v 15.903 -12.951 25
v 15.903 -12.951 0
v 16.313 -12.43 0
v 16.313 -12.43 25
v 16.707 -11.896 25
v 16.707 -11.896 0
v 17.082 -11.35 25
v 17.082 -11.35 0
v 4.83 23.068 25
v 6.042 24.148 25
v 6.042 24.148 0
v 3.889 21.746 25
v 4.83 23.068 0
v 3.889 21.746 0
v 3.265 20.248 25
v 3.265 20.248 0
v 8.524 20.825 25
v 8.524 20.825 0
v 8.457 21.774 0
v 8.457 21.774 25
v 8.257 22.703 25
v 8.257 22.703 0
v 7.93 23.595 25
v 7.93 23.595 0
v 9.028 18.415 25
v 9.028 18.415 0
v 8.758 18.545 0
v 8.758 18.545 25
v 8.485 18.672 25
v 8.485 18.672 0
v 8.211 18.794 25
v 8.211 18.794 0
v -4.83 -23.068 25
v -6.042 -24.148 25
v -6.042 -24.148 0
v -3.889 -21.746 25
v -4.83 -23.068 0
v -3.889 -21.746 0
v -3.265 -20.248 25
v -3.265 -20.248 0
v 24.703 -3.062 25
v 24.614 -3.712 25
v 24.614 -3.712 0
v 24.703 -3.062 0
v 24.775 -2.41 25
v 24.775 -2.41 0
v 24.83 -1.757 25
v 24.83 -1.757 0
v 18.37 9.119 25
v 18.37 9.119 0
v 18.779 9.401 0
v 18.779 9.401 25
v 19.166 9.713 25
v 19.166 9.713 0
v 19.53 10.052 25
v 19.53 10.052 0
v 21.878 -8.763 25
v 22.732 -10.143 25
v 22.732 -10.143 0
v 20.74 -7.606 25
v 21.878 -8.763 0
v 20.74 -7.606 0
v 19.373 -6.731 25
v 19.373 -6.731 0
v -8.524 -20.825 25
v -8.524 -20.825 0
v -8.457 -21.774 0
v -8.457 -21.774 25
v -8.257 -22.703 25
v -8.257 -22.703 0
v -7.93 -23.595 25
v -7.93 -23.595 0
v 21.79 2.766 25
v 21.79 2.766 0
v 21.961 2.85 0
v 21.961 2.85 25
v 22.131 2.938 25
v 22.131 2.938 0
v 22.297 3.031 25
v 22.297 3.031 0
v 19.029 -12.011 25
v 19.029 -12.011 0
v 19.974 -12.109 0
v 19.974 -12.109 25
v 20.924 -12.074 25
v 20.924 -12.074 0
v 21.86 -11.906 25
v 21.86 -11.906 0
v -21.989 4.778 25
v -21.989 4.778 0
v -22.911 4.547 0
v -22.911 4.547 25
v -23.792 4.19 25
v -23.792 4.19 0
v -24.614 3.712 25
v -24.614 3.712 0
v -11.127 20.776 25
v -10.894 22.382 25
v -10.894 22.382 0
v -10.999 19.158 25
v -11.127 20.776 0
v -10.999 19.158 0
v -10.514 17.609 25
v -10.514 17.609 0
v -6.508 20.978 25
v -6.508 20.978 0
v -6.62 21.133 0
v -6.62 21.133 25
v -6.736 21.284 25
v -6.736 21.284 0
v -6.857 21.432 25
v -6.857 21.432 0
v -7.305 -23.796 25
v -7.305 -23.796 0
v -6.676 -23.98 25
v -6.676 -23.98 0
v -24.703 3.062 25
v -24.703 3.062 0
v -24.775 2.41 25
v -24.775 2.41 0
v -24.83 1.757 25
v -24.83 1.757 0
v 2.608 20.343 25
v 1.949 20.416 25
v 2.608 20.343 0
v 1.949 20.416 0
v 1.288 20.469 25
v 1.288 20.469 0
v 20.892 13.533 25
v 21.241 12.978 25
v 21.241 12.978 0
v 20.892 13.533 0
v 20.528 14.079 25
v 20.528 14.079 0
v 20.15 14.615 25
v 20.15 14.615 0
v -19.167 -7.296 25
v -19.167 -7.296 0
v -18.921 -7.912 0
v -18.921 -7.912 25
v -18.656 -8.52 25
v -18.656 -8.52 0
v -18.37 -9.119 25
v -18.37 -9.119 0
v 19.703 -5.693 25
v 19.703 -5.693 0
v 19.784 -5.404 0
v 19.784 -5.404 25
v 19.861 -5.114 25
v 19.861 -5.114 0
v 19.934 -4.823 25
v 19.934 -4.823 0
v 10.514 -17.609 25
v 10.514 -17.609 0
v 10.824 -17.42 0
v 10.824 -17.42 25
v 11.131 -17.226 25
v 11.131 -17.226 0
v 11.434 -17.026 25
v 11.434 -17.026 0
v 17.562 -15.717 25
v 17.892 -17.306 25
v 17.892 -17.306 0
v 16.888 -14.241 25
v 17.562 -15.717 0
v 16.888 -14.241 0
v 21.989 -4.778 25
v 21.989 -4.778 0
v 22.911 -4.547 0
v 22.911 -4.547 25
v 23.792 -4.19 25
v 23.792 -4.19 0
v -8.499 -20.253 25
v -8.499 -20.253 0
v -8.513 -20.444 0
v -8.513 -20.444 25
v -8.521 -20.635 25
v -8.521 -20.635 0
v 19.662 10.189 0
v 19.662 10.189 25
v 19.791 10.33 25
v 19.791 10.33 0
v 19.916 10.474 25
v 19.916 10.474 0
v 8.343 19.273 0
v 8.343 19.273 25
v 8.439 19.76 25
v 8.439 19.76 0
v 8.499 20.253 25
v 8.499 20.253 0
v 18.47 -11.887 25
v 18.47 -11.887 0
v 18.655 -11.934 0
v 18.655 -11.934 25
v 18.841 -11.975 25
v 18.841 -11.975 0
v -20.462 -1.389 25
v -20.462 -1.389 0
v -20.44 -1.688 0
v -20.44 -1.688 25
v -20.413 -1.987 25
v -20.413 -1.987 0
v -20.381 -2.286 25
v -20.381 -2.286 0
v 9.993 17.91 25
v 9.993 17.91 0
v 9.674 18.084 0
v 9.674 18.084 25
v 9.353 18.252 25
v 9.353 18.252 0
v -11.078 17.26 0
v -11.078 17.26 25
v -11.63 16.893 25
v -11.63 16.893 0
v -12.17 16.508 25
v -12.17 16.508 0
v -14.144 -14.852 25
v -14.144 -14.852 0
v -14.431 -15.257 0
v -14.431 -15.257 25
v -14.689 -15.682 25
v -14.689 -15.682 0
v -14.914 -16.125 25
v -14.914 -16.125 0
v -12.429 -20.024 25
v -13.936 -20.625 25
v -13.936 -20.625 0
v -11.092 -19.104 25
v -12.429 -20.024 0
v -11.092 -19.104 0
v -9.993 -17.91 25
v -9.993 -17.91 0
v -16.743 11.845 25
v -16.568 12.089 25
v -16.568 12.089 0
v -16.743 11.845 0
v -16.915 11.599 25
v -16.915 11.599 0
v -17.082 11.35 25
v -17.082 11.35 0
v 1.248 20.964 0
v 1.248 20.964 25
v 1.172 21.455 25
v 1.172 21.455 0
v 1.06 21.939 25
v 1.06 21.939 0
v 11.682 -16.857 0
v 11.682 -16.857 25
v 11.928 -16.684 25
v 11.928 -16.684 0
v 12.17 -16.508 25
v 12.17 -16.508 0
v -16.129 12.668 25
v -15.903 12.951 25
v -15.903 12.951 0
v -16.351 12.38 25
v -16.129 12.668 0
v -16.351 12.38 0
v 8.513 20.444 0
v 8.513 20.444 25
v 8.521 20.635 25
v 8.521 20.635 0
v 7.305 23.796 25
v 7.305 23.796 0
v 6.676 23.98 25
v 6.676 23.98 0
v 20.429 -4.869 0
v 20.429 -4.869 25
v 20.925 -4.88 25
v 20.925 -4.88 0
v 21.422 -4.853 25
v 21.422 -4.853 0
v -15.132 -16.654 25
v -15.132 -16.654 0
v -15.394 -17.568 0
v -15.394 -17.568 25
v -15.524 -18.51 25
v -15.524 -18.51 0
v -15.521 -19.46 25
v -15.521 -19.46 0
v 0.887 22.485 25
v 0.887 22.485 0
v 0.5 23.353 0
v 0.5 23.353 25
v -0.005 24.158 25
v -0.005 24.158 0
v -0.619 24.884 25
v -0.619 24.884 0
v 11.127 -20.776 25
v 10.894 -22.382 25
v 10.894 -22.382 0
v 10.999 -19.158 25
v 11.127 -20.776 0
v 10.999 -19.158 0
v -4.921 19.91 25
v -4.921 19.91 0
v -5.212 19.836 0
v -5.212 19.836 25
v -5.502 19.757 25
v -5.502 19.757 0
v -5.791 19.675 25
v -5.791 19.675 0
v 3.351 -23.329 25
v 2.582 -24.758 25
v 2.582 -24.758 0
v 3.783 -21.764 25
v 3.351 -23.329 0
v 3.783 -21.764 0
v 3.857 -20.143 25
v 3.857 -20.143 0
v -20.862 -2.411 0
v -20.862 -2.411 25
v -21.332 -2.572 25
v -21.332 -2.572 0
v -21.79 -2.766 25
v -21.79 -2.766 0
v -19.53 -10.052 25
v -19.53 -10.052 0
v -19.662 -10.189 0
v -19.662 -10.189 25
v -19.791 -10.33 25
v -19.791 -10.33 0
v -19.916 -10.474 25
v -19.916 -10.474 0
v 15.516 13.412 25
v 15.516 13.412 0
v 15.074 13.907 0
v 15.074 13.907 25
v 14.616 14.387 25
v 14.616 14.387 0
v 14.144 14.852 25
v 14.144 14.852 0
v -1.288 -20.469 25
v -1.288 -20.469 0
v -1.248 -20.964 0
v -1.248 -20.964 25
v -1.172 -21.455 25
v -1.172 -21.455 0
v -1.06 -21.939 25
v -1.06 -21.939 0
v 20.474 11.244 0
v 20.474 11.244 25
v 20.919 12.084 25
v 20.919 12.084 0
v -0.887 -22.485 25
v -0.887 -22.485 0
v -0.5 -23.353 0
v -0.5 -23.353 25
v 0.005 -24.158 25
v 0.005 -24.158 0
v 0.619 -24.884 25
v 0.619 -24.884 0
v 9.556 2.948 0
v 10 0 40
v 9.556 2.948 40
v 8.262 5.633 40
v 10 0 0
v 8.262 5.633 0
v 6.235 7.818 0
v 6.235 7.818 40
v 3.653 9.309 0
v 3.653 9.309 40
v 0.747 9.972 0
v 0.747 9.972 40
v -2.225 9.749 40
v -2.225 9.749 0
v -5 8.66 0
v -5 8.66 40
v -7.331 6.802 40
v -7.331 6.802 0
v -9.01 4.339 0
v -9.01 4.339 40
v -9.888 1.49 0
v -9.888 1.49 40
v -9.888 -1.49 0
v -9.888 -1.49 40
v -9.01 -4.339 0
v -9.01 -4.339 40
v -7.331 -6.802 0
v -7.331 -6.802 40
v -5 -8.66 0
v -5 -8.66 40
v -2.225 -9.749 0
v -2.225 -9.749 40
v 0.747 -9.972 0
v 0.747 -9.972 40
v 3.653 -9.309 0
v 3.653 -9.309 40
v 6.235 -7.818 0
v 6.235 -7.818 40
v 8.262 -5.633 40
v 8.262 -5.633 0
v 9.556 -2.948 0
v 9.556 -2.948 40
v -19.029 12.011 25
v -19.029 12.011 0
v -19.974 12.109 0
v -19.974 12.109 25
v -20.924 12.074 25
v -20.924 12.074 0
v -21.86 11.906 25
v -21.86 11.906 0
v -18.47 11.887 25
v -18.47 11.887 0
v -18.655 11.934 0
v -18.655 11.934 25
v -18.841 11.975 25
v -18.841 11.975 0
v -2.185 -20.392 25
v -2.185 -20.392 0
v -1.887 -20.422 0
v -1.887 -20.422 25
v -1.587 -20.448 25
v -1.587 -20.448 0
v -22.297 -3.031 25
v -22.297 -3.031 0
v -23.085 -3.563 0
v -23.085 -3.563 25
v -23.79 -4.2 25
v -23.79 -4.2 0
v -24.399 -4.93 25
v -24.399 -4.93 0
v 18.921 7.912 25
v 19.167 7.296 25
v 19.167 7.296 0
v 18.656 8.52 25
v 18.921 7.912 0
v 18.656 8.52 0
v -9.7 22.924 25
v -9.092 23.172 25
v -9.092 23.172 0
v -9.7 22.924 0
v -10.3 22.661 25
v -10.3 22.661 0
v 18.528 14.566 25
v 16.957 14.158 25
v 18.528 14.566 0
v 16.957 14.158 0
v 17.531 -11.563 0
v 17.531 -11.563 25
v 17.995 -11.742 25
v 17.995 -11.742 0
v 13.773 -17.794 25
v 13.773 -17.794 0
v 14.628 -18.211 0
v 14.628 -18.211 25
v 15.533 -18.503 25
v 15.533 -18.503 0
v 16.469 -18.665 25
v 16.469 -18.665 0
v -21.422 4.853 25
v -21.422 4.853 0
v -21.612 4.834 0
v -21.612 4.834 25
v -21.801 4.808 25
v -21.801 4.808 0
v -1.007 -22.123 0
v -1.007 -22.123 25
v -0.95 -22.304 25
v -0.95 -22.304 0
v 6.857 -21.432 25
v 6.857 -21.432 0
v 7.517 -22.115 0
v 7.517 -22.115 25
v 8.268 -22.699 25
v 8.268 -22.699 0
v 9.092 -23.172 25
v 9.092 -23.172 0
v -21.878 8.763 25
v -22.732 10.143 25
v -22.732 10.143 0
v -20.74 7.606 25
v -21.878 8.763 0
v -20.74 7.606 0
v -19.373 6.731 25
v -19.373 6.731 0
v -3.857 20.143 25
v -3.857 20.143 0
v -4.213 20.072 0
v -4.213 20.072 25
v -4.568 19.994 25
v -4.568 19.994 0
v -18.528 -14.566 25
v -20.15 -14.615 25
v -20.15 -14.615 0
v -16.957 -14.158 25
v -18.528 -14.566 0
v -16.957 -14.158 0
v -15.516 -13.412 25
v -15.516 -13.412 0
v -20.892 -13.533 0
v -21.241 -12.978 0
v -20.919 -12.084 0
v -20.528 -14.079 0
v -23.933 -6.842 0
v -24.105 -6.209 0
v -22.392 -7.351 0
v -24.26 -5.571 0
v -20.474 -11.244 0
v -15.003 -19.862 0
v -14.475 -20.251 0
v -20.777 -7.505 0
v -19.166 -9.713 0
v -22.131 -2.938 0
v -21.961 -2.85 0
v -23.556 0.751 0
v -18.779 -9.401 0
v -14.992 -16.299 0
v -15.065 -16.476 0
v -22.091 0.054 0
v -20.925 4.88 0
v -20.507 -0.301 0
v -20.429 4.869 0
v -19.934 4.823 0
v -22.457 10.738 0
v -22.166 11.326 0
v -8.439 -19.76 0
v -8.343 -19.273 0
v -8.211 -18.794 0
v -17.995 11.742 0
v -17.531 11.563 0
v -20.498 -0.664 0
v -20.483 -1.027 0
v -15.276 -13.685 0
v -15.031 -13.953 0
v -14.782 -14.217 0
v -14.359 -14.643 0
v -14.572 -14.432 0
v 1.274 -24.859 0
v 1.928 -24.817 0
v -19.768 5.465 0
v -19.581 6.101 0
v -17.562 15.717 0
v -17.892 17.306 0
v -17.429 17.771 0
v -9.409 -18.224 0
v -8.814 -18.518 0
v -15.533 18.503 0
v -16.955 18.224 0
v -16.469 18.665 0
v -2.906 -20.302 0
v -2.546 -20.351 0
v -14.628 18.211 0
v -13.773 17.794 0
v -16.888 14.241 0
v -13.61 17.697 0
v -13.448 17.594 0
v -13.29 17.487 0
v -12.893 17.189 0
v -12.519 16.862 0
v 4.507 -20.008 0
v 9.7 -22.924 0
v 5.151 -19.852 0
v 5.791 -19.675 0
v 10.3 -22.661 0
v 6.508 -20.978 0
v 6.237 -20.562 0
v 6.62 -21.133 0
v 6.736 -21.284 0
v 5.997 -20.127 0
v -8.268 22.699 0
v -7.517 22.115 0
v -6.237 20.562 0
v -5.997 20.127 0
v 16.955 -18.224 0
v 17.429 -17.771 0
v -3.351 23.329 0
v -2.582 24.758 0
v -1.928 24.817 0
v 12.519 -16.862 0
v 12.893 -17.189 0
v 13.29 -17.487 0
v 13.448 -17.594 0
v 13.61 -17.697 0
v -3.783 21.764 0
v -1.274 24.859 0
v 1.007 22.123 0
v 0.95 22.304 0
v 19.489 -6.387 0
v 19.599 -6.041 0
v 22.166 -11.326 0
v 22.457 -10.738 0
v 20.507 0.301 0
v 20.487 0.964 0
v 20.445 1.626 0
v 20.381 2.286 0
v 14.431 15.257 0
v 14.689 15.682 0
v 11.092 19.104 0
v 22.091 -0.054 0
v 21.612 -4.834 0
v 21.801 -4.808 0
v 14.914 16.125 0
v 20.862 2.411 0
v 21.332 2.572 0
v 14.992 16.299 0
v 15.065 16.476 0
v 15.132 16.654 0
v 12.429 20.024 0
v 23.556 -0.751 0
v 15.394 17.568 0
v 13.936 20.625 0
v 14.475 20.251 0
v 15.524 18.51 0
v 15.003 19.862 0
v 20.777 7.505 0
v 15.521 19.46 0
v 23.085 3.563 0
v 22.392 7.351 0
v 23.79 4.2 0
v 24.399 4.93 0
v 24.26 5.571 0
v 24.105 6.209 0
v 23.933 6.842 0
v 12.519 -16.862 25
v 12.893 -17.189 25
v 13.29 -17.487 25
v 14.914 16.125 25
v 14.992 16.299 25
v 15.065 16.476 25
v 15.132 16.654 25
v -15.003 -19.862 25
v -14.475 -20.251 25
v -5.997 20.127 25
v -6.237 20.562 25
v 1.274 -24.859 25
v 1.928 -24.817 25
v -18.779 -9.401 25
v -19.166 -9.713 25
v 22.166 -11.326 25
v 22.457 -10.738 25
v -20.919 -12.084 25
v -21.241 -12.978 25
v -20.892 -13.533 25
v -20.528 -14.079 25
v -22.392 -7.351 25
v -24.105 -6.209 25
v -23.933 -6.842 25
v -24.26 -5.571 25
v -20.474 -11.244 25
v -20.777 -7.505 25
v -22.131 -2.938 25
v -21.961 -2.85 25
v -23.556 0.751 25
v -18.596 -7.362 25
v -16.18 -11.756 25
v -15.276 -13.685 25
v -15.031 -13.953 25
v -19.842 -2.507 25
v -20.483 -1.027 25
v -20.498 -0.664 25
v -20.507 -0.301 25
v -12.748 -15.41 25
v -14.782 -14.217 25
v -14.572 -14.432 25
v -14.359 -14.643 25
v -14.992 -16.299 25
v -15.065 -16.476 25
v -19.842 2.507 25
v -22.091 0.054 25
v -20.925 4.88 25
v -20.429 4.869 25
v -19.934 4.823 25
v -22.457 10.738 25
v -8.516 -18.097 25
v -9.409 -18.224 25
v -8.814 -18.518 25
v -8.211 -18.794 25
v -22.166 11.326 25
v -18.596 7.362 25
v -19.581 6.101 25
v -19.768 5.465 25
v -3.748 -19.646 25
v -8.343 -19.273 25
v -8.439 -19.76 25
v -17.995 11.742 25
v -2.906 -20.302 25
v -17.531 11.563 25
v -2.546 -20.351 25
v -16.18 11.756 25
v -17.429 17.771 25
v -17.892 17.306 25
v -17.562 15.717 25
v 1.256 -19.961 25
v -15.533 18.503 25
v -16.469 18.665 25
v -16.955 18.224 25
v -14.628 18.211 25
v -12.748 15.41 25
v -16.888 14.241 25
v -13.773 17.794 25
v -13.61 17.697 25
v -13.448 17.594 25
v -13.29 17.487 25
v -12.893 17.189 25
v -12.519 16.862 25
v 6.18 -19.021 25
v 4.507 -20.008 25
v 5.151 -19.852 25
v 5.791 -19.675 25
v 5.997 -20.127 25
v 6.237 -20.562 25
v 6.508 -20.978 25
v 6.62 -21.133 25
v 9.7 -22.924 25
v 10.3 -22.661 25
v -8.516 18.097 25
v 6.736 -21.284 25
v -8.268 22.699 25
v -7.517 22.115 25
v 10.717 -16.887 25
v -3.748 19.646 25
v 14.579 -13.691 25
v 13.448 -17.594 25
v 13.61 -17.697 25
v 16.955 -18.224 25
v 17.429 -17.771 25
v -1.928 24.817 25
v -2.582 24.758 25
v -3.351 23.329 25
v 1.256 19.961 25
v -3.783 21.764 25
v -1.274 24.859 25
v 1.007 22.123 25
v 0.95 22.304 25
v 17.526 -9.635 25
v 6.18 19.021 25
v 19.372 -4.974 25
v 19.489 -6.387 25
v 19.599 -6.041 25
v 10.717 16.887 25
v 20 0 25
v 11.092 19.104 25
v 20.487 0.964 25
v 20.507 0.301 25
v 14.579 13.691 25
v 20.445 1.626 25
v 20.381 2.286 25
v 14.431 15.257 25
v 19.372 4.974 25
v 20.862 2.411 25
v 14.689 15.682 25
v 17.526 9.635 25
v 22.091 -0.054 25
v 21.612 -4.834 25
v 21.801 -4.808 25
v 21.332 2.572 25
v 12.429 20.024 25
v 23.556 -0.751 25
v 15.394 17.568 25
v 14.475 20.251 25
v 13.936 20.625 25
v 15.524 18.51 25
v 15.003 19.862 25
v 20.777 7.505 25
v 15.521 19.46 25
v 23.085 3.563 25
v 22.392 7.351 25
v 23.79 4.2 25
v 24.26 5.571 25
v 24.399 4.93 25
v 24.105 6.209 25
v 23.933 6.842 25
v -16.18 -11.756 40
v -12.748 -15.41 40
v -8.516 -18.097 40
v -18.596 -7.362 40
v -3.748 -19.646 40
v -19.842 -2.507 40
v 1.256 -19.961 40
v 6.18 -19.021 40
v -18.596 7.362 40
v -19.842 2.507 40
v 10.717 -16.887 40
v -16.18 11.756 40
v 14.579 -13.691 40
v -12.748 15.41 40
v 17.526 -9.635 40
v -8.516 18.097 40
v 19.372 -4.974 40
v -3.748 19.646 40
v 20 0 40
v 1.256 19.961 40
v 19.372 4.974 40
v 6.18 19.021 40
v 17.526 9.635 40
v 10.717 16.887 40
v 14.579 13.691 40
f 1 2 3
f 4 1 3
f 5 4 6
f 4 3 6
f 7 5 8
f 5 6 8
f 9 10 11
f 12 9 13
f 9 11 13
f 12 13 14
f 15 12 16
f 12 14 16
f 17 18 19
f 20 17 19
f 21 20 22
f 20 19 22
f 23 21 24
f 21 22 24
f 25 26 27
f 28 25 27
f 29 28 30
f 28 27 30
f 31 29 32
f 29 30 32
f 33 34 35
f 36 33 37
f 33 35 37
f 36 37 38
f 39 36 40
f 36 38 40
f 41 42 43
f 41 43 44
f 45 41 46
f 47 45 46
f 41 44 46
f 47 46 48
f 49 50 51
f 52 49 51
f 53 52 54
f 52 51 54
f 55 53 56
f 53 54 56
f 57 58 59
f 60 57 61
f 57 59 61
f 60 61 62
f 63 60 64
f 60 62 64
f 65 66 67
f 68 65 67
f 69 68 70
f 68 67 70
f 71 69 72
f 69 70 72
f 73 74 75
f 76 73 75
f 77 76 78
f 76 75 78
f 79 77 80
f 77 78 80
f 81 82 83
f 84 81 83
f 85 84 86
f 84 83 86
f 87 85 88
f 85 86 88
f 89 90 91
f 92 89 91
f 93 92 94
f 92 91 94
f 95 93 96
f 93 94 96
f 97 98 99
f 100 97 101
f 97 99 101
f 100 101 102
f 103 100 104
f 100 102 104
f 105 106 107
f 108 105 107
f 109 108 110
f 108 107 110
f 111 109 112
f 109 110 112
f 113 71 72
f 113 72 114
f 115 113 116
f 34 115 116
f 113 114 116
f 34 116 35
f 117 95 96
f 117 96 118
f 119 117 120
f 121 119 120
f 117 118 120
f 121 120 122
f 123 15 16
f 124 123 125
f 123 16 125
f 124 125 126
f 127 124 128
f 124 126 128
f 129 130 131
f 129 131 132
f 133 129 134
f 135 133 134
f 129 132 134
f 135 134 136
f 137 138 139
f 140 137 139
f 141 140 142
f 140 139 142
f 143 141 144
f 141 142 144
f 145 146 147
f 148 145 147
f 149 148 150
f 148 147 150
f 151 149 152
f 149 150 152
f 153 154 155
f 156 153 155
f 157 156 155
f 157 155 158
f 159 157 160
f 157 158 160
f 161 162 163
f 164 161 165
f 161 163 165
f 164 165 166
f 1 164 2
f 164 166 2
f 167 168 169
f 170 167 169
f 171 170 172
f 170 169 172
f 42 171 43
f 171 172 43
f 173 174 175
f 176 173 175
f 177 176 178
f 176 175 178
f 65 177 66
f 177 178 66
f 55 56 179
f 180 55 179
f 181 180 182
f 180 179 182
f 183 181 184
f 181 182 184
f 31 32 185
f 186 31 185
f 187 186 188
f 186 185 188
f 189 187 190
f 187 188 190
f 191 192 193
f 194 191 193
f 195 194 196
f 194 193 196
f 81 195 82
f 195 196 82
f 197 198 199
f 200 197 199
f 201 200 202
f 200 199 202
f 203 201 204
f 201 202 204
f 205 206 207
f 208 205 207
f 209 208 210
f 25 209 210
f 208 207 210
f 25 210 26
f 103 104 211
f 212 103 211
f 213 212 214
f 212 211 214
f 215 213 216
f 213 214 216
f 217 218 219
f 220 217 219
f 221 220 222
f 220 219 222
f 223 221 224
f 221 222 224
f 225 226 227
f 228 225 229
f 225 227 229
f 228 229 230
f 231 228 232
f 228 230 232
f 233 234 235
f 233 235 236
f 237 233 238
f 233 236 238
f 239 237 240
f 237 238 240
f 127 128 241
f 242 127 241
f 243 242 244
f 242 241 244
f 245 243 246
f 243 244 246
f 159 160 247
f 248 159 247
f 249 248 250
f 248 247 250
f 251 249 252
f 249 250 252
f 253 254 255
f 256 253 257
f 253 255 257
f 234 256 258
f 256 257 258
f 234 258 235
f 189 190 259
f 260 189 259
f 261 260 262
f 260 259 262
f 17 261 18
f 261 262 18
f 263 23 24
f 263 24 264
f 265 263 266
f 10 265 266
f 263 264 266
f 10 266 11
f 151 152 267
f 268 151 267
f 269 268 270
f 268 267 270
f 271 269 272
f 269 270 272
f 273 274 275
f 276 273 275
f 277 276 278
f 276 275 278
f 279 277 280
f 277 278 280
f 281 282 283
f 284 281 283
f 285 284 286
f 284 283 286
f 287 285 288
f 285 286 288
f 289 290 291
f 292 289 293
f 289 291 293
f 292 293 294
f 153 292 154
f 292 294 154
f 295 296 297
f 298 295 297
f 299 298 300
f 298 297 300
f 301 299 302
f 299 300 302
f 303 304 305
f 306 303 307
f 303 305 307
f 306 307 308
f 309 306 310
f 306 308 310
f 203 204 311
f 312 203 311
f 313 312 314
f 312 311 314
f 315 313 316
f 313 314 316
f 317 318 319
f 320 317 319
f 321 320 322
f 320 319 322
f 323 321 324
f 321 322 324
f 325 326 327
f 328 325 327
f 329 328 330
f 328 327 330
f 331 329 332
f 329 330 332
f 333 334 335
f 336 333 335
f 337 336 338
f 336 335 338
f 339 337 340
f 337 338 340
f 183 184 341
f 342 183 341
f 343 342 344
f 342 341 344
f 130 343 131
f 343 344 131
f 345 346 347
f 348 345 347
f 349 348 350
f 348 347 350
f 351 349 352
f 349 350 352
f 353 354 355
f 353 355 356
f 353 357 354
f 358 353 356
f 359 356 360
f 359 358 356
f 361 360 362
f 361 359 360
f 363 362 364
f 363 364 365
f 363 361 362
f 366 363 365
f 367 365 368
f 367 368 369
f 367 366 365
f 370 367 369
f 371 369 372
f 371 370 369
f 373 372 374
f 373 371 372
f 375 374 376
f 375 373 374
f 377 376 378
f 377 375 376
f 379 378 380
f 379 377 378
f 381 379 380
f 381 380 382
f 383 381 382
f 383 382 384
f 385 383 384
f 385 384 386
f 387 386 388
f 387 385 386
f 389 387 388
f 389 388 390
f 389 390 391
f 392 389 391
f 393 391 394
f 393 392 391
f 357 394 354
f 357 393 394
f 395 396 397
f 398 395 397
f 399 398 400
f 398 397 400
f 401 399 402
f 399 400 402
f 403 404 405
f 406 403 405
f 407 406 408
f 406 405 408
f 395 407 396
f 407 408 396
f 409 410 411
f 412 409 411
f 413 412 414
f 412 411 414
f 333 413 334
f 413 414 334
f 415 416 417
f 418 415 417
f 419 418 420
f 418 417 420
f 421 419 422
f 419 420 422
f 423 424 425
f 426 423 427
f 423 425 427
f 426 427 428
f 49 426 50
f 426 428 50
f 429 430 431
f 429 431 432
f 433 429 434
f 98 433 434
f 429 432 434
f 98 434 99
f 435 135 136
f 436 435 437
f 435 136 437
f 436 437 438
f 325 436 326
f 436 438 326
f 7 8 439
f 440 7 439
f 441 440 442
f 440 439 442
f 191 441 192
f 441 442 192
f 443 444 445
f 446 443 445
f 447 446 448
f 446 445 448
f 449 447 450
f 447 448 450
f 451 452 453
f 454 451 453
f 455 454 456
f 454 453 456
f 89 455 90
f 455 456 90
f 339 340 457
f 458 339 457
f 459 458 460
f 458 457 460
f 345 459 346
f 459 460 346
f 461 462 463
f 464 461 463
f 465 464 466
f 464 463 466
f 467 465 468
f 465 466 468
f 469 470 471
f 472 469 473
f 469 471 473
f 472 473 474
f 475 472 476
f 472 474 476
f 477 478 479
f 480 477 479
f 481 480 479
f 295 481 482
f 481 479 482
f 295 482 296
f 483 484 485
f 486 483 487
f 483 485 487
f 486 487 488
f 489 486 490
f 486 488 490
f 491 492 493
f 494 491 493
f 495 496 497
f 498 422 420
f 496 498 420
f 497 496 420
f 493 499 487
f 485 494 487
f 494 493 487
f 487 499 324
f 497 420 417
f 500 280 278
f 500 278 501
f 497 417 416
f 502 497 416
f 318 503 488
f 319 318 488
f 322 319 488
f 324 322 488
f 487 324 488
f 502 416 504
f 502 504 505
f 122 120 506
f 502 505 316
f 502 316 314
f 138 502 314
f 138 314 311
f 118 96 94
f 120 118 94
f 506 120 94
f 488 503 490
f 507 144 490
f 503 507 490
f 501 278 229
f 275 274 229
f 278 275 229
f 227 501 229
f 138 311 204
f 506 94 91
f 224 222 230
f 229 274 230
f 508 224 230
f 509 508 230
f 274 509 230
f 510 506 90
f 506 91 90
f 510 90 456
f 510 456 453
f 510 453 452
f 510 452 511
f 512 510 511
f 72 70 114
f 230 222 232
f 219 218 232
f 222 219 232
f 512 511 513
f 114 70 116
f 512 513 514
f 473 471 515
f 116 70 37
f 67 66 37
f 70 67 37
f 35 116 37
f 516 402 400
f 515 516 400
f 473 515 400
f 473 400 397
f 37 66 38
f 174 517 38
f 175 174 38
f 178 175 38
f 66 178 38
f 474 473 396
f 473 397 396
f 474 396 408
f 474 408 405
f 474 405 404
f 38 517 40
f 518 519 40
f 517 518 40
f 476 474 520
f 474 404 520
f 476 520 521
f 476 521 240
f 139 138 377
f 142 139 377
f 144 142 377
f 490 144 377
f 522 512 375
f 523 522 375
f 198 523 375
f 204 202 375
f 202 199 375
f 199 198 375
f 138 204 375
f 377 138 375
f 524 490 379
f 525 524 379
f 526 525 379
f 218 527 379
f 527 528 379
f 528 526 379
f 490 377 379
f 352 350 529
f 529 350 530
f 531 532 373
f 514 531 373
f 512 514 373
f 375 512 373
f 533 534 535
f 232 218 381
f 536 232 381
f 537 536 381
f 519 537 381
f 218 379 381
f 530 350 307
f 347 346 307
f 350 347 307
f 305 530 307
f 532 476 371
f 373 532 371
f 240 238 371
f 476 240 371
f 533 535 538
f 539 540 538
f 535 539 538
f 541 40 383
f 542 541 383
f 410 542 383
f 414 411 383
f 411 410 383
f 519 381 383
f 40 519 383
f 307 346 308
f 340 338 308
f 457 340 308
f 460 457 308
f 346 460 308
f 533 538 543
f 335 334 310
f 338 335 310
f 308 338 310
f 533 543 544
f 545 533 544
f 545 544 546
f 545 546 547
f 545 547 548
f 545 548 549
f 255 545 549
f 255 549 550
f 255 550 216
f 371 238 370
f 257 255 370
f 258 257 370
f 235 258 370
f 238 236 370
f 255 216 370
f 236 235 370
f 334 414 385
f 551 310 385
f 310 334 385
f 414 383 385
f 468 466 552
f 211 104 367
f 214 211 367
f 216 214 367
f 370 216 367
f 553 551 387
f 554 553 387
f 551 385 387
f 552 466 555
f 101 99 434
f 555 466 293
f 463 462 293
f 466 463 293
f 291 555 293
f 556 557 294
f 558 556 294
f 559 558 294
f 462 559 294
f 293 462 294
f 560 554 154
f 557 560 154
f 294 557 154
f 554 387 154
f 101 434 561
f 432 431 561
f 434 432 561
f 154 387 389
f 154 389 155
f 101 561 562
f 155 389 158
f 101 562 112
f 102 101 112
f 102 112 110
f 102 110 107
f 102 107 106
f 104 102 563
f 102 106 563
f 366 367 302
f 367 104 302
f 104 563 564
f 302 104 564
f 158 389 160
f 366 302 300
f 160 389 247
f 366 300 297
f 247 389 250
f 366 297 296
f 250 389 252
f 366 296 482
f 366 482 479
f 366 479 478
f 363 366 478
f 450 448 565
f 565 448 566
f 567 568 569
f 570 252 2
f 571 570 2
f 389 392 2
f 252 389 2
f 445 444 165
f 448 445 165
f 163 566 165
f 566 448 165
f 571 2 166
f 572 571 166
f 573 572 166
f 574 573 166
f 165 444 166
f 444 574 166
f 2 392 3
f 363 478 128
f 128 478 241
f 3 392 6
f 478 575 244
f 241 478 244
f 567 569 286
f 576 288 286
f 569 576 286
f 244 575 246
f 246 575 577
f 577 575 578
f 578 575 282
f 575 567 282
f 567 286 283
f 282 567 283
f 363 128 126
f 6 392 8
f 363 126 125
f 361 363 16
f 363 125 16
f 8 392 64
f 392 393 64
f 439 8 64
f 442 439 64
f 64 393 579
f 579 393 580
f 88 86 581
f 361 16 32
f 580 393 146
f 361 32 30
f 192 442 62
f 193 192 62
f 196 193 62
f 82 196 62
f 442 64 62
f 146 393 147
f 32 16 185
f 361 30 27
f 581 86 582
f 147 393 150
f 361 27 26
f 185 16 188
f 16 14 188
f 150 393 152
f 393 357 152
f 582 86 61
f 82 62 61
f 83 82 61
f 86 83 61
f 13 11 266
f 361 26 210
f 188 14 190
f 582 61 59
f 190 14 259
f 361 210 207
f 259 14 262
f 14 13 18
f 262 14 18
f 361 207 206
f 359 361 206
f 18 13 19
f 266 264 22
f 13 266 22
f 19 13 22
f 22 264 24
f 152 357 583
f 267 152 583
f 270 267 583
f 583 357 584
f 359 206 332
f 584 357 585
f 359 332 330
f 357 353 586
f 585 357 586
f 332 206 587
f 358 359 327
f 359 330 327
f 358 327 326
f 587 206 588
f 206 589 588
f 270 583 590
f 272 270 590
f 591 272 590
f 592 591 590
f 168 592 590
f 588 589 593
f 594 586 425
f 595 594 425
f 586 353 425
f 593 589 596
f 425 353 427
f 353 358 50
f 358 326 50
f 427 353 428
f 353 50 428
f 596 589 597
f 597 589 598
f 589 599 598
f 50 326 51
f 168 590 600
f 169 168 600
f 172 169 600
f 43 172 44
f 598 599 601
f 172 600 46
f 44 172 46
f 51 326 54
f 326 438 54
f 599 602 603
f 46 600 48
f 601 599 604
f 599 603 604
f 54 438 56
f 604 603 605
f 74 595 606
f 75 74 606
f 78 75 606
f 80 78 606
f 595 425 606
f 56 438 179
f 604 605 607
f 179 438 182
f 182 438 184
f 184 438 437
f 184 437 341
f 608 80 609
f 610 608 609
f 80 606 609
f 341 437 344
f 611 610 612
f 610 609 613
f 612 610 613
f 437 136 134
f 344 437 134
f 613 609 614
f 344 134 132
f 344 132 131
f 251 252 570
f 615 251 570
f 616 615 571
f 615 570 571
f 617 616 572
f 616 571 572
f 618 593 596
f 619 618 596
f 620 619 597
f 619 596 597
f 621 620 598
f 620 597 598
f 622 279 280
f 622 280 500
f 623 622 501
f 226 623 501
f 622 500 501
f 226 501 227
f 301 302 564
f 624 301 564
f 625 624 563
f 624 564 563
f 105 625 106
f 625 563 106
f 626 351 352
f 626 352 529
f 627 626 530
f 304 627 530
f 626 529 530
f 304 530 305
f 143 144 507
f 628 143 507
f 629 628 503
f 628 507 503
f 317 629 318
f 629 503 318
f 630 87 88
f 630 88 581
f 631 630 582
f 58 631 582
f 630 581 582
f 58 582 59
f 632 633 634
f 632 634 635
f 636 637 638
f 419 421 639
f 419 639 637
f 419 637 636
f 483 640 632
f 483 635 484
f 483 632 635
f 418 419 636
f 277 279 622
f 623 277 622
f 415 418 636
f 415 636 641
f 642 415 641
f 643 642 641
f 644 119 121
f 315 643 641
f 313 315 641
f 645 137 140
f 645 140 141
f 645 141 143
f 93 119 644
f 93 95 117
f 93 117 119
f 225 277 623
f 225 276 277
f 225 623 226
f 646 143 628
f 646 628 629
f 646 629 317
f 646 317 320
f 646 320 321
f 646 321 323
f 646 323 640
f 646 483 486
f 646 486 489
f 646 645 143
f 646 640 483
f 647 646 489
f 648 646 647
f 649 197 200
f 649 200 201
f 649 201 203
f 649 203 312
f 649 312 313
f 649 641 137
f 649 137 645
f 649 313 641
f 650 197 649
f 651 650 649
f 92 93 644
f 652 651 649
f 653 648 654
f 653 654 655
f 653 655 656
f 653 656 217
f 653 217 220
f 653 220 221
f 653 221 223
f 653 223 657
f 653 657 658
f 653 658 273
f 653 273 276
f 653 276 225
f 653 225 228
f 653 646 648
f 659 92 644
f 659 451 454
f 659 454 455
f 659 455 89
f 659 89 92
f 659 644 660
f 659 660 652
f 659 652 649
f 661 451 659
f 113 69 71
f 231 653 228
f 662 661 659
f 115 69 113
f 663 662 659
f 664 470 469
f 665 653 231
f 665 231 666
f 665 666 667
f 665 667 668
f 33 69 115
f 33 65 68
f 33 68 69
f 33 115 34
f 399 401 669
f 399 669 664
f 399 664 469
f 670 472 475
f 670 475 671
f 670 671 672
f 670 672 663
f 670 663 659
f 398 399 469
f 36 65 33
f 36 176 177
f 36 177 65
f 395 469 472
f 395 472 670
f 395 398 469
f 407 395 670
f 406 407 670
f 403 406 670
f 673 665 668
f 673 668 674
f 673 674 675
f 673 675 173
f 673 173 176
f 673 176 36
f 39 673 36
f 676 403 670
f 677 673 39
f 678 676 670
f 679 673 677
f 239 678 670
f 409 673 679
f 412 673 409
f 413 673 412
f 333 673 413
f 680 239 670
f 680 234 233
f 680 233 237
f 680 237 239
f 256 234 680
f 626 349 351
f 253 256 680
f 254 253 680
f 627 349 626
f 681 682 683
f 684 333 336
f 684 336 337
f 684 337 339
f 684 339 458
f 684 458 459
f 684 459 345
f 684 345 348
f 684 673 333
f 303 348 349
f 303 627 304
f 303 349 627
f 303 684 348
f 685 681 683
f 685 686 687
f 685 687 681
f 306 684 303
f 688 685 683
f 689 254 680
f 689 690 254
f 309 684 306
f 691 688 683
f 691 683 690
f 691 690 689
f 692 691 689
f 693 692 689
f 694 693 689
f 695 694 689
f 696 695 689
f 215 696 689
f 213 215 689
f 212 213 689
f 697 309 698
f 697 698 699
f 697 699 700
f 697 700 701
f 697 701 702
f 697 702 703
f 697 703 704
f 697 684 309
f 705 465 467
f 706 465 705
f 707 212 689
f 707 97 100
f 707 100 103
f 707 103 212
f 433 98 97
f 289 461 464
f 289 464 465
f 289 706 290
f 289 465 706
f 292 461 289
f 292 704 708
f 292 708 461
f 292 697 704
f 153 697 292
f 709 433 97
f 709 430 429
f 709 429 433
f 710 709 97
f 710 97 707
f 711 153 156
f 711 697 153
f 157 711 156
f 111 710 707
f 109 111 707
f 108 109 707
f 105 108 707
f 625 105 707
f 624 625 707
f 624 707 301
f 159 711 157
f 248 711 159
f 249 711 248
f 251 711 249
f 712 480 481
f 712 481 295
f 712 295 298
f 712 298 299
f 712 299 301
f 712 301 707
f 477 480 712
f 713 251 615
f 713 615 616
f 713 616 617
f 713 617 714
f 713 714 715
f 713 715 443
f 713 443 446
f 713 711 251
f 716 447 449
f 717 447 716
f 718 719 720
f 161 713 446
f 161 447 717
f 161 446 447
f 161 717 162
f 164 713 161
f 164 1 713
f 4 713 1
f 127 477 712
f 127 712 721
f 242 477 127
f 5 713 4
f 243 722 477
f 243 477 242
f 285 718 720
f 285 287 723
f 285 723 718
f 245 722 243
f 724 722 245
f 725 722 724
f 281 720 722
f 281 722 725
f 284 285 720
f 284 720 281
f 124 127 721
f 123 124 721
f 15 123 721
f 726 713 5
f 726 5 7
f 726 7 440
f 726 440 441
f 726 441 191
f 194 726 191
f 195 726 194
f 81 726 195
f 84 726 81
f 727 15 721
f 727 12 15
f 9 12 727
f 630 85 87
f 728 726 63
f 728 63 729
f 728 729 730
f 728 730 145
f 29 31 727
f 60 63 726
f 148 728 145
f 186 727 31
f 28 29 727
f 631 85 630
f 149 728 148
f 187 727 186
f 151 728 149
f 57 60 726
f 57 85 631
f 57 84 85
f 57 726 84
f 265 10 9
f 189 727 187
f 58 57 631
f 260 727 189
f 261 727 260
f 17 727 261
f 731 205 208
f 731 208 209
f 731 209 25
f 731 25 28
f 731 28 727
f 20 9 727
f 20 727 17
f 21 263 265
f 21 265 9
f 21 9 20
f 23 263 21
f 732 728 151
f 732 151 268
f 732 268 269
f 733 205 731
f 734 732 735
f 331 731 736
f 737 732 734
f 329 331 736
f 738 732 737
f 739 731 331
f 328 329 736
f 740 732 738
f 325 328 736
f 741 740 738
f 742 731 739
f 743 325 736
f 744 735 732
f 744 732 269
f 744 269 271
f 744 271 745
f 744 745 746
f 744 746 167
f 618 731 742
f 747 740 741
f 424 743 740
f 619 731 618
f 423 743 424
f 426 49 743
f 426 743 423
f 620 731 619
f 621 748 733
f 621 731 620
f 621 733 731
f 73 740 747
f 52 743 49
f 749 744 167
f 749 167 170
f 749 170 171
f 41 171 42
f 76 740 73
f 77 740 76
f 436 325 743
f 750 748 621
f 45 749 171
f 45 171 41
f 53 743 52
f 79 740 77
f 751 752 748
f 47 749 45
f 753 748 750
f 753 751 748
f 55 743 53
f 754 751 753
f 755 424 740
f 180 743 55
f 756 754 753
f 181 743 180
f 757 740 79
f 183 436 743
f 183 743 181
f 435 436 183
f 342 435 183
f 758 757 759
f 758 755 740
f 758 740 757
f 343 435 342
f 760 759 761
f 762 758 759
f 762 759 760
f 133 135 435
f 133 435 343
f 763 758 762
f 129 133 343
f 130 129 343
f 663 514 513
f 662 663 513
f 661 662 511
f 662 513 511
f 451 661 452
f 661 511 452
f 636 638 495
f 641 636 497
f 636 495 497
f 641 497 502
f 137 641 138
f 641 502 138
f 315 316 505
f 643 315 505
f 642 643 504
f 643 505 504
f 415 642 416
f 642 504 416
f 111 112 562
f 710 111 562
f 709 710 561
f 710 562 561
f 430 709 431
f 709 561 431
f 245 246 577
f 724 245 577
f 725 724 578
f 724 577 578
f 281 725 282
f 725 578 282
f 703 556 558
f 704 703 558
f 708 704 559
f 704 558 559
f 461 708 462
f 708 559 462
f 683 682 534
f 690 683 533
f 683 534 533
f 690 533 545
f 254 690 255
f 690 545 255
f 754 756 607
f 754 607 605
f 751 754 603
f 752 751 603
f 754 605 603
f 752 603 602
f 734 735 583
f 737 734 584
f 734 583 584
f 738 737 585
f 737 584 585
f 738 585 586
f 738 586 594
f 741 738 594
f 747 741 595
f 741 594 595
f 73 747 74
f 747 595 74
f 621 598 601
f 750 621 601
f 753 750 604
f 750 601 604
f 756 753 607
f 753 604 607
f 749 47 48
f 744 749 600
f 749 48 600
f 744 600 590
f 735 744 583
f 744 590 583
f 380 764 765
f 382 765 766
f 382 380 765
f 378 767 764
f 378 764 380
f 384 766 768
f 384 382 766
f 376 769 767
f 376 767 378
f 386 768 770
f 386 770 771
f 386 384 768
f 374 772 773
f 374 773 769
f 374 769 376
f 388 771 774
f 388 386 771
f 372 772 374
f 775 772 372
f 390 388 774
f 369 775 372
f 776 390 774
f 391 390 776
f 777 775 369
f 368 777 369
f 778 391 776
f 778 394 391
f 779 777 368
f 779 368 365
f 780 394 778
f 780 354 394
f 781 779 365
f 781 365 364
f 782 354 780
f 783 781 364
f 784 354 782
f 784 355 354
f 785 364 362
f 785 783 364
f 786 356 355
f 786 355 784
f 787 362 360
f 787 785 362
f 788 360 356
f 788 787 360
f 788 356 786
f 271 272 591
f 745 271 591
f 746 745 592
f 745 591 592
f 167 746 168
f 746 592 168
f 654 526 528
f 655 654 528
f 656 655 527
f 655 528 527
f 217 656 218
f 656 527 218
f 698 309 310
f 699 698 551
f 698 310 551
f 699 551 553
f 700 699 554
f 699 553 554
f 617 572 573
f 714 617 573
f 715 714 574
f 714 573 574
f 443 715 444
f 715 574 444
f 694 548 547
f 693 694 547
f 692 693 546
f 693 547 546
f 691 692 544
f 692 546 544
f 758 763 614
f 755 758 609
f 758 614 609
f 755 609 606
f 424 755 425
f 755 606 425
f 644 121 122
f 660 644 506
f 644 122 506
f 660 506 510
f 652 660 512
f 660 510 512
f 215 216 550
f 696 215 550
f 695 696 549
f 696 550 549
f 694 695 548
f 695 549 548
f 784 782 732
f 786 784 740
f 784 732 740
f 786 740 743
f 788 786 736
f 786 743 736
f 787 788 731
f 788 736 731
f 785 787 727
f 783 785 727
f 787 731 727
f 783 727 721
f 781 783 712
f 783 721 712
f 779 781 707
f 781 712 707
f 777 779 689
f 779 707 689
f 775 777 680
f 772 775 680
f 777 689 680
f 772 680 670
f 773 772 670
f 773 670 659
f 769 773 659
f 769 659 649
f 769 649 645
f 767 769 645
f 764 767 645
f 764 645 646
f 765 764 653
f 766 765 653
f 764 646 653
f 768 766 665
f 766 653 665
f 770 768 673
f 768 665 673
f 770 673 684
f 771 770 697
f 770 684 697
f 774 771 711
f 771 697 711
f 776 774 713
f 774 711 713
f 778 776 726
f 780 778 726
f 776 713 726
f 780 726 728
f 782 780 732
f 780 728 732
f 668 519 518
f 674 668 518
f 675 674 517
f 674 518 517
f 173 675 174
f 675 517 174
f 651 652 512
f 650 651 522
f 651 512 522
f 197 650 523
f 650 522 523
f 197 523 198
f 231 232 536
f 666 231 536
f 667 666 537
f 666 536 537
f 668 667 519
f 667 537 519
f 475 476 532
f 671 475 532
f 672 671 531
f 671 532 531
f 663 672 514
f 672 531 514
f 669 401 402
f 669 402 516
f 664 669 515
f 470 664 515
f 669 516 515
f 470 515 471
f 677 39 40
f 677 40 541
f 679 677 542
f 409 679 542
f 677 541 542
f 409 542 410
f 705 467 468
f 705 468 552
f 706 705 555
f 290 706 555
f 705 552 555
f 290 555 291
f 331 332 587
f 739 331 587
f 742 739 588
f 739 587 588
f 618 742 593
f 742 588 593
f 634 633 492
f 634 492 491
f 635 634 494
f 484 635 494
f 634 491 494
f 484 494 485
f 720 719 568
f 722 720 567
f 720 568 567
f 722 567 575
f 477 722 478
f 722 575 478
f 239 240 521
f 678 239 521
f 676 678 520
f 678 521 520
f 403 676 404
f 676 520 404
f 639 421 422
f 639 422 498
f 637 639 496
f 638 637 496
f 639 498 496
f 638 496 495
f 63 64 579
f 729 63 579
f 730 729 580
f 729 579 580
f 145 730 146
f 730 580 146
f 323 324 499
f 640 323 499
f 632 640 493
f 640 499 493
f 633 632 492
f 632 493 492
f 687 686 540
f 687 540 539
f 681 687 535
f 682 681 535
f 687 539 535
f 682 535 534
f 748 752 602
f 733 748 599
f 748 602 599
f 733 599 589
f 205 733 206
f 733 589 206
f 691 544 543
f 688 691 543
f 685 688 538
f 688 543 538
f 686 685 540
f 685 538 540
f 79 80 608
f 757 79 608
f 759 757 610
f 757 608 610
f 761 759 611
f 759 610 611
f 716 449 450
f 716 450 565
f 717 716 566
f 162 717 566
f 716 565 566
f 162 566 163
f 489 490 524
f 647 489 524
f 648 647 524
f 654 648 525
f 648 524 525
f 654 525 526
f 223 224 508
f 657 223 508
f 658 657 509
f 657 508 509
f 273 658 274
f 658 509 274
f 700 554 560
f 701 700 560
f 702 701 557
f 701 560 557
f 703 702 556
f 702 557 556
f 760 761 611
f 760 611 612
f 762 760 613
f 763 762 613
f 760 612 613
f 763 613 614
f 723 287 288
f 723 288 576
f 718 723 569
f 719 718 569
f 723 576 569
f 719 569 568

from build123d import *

# Parameters (mm, degrees)
F0_R     = 10
F1_DEPTH = 25
F2_COUNT = 18
F3_R     = 20
F3_R_2   = 10
F4_DEPTH = 15


with BuildPart() as f1:
    # F0 (on Top) → F1 (new body)
    with BuildSketch(Plane.XY):
        with BuildLine():
            ThreePointArc((7.9296197565, 23.5951858335), (6.9911317973, 23.8900761864), (6.0417249702, 24.1476546146))
            ThreePointArc((6.0417249702, 24.1476546146), (4.3226425573, 22.4330749308), (3.2648662162, 20.2476374354))
            ThreePointArc((3.2648662162, 20.2476374354), (5.7837443287, 19.6767495961), (8.2108987358, 18.7938105523))
            ThreePointArc((8.2108987358, 18.7938105523), (8.3954934616, 19.5156536929), (8.4994507341, 20.2534379554))
            ThreePointArc((8.4994507341, 20.2534379554), (8.5176465567, 20.5391701676), (8.5237154667, 20.8254168329))
            ThreePointArc((8.5237154667, 20.8254168329), (8.373521449, 22.2418004346), (7.9296197565, 23.5951858335))
        make_face()
        with BuildLine():
            ThreePointArc((4.0264902572, 14.4598933509), (-1.7431476836, 15.057566034), (-4.9211585336, 19.9100068261))
            ThreePointArc((-4.9211585336, 19.9100068261), (-12.6431262329, -16.1486077476), (20.5091729021, 0))
            ThreePointArc((20.5091729021, 0), (19.2415803806, 7.0984334598), (15.5954927821, 13.3194135761))
            ThreePointArc((15.5954927821, 13.3194135761), (9.5256046991, 10.9946956396), (4.0264902572, 14.4598933509))
        make_face()
        Circle(F0_R, mode=Mode.SUBTRACT)
        with BuildLine():
            ThreePointArc((3.2648662162, 20.2476374354), (-0.8451772993, 20.4917507417), (-4.9211585336, 19.9100068261))
            ThreePointArc((-4.9211585336, 19.9100068261), (-1.7431476836, 15.057566034), (4.0264902572, 14.4598933509))
            ThreePointArc((4.0264902572, 14.4598933509), (3.0384725246, 17.2738616412), (3.2648662162, 20.2476374354))
        make_face()
        with BuildLine():
            ThreePointArc((4.0264902572, 14.4598933509), (9.5256046991, 10.9946956396), (15.5954927821, 13.3194135761))
            ThreePointArc((15.5954927821, 13.3194135761), (12.2138579016, 16.4756744411), (8.2108987358, 18.7938105523))
            ThreePointArc((8.2108987358, 18.7938105523), (6.6287005247, 16.1344397874), (4.0264902572, 14.4598933509))
        make_face()
        with BuildLine():
            ThreePointArc((8.2108987358, 18.7938105523), (5.7837443287, 19.6767495961), (3.2648662162, 20.2476374354))
            ThreePointArc((3.2648662162, 20.2476374354), (3.0384725246, 17.2738616412), (4.0264902572, 14.4598933509))
            ThreePointArc((4.0264902572, 14.4598933509), (6.6287005247, 16.1344397874), (8.2108987358, 18.7938105523))
        make_face()
    extrude(amount=F1_DEPTH)

    # F2: F1 ×18 about axis
    f2_axis = Axis((0, 0, 25), (0, 0, 1))


with BuildPart() as f1_1:
    add(f1.part)
    for i in range(1, F2_COUNT):
        add(f1.part.rotate(f2_axis, i * 360 / F2_COUNT))

    # F3 (on face) → F4 (join)
    with BuildSketch(Plane.XY.offset(25)):
        Circle(F3_R)
        Circle(F3_R_2, mode=Mode.SUBTRACT)
    extrude(amount=F4_DEPTH)


solid = f1_1.part
